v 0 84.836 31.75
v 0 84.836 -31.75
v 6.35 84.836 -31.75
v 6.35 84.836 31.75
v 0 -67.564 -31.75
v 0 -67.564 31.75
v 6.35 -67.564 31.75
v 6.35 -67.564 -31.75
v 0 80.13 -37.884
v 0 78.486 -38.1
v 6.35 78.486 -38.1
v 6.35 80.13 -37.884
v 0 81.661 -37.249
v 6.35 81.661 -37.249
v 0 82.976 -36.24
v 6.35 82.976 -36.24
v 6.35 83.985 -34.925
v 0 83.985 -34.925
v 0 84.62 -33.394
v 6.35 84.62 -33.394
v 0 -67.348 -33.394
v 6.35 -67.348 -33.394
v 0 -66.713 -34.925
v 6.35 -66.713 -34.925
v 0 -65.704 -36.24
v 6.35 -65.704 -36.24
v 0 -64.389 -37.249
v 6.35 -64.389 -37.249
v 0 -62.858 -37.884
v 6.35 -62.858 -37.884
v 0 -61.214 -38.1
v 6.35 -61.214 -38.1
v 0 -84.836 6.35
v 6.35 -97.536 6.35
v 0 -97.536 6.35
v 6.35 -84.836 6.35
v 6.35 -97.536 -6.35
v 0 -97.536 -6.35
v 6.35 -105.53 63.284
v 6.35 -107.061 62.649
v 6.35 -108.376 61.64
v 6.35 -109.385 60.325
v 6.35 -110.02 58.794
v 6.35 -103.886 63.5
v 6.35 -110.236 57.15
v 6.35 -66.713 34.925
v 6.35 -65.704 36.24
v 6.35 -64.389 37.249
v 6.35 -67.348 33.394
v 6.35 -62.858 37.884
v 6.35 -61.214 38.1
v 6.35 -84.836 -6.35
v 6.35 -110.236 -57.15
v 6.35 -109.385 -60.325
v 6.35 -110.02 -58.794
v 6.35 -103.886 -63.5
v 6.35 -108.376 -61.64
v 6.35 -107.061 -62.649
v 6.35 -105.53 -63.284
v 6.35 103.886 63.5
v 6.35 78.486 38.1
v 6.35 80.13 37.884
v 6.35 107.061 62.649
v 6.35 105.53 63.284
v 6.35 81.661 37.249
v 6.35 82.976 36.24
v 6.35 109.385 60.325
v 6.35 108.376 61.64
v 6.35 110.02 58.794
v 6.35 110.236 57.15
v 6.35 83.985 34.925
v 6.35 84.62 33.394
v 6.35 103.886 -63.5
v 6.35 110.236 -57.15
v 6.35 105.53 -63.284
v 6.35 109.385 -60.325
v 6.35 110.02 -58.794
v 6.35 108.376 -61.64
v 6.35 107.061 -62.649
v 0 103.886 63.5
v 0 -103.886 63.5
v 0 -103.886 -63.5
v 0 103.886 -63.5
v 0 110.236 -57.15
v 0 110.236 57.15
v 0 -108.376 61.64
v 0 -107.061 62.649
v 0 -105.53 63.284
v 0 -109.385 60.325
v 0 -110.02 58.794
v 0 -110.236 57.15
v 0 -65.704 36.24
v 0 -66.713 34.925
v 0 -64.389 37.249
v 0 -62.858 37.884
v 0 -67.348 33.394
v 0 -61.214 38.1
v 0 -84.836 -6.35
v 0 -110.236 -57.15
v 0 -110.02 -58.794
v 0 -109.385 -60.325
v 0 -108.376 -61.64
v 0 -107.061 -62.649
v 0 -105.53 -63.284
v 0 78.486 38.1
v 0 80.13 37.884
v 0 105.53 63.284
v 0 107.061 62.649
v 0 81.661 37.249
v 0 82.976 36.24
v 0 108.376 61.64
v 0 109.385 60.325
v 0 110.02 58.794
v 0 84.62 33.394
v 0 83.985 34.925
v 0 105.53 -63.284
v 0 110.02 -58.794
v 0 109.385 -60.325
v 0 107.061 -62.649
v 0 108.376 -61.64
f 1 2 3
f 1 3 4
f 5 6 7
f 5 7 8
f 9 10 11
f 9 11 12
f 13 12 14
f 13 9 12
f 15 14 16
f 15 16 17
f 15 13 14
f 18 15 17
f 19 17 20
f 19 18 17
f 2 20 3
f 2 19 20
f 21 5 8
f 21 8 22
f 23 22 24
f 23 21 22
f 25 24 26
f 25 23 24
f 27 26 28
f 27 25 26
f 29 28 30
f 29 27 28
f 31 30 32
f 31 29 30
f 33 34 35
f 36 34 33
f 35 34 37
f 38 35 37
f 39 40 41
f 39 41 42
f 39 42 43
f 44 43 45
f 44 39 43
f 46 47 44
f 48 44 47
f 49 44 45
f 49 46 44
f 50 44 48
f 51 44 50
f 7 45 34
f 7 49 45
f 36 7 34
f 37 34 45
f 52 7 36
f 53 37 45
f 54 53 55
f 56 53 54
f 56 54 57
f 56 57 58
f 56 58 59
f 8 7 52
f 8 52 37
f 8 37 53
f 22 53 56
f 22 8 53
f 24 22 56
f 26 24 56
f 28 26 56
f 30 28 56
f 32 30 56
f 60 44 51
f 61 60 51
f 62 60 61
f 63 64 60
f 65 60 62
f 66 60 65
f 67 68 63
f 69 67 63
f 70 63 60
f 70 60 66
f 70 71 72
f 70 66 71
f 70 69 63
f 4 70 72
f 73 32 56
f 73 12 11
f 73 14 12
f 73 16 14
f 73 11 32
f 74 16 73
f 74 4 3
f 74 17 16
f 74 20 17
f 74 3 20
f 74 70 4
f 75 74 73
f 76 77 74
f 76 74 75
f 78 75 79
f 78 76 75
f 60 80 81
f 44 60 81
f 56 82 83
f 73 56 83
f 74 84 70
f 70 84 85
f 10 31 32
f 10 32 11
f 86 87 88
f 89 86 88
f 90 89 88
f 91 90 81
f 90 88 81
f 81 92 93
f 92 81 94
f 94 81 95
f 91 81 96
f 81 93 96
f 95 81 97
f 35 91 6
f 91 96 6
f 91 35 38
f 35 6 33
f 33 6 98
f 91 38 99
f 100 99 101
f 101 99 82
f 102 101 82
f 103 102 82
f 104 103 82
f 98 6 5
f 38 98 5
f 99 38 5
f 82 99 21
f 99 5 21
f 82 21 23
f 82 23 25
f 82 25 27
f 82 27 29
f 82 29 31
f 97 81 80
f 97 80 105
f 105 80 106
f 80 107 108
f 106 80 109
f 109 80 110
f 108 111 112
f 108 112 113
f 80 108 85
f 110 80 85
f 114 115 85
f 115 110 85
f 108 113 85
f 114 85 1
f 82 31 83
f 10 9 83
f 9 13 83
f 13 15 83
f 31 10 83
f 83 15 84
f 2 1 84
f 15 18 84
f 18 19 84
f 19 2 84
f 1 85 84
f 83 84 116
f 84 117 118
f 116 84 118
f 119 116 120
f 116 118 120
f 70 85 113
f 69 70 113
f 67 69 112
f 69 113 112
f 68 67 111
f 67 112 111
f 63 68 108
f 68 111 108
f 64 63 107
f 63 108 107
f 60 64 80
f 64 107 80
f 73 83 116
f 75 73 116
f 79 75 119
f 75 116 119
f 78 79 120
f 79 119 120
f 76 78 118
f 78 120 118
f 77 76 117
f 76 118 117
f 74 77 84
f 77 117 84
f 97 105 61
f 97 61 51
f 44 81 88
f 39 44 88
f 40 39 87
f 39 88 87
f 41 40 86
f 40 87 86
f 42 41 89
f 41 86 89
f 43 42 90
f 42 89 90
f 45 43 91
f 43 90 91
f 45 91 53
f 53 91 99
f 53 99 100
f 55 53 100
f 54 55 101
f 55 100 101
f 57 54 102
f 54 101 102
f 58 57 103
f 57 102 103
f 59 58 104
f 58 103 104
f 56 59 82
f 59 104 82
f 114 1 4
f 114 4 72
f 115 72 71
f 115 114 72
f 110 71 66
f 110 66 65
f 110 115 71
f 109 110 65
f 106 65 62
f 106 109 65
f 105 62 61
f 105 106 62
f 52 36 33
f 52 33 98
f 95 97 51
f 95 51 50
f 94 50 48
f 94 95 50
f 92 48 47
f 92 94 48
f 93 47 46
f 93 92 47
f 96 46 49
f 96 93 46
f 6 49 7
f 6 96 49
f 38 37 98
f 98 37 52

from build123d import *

# Parameters (mm, degrees)
BOSS_EXTRUDE2_DEPTH = 6.35
CUT_EXTRUDE1_REACH  = 129.376
SKETCH4_W           = 12.7
SKETCH4_H           = 12.7


with BuildPart() as part:
    # Sketch3 → Boss-Extrude2 (new body)
    with BuildSketch(Plane(origin=(0, 0, 0), x_dir=(0, 0, -1), z_dir=(1, 0, 0))):
        with BuildLine():
            Line((-57.15, -110.236), (57.15, -110.236))
            ThreePointArc((57.15, -110.236), (61.640128061, -108.376128061), (63.5, -103.886))
            Line((63.5, -103.886), (63.5, 103.886))
            ThreePointArc((63.5, 103.886), (61.640128061, 108.376128061), (57.15, 110.236))
            Line((57.15, 110.236), (-57.15, 110.236))
            ThreePointArc((-57.15, 110.236), (-61.640128061, 108.376128061), (-63.5, 103.886))
            Line((-63.5, 103.886), (-63.5, -103.886))
            ThreePointArc((-63.5, -103.886), (-61.640128061, -108.376128061), (-57.15, -110.236))
        make_face()
        with BuildLine():
            Line((-31.75, -67.564), (31.75, -67.564))
            ThreePointArc((31.75, -67.564), (36.240128061, -65.704128061), (38.1, -61.214))
            Line((38.1, -61.214), (38.1, 78.486))
            ThreePointArc((38.1, 78.486), (36.240128061, 82.976128061), (31.75, 84.836))
            Line((31.75, 84.836), (-31.75, 84.836))
            ThreePointArc((-31.75, 84.836), (-36.240128061, 82.976128061), (-38.1, 78.486))
            Line((-38.1, 78.486), (-38.1, -61.214))
            ThreePointArc((-38.1, -61.214), (-36.240128061, -65.704128061), (-31.75, -67.564))
        make_face(mode=Mode.SUBTRACT)
    extrude(amount=BOSS_EXTRUDE2_DEPTH)

    # Sketch4 → Cut-Extrude1 (cut, up to next)
    with BuildSketch(Plane(origin=(6.35, 0, 0), x_dir=(0, 0, -1), z_dir=(1, 0, 0)), mode=Mode.PRIVATE) as cut_extrude1_sk1:
        with Locations((0, -91.186)):
            Rectangle(SKETCH4_W, SKETCH4_H)
    cut_extrude1_tool1 = extrude(cut_extrude1_sk1.sketch, amount=-CUT_EXTRUDE1_REACH, mode=Mode.PRIVATE) & part.part
    add(cut_extrude1_tool1.solids().sort_by_distance((6.35, -91.186, 0))[0], mode=Mode.SUBTRACT)


solid = part.part
